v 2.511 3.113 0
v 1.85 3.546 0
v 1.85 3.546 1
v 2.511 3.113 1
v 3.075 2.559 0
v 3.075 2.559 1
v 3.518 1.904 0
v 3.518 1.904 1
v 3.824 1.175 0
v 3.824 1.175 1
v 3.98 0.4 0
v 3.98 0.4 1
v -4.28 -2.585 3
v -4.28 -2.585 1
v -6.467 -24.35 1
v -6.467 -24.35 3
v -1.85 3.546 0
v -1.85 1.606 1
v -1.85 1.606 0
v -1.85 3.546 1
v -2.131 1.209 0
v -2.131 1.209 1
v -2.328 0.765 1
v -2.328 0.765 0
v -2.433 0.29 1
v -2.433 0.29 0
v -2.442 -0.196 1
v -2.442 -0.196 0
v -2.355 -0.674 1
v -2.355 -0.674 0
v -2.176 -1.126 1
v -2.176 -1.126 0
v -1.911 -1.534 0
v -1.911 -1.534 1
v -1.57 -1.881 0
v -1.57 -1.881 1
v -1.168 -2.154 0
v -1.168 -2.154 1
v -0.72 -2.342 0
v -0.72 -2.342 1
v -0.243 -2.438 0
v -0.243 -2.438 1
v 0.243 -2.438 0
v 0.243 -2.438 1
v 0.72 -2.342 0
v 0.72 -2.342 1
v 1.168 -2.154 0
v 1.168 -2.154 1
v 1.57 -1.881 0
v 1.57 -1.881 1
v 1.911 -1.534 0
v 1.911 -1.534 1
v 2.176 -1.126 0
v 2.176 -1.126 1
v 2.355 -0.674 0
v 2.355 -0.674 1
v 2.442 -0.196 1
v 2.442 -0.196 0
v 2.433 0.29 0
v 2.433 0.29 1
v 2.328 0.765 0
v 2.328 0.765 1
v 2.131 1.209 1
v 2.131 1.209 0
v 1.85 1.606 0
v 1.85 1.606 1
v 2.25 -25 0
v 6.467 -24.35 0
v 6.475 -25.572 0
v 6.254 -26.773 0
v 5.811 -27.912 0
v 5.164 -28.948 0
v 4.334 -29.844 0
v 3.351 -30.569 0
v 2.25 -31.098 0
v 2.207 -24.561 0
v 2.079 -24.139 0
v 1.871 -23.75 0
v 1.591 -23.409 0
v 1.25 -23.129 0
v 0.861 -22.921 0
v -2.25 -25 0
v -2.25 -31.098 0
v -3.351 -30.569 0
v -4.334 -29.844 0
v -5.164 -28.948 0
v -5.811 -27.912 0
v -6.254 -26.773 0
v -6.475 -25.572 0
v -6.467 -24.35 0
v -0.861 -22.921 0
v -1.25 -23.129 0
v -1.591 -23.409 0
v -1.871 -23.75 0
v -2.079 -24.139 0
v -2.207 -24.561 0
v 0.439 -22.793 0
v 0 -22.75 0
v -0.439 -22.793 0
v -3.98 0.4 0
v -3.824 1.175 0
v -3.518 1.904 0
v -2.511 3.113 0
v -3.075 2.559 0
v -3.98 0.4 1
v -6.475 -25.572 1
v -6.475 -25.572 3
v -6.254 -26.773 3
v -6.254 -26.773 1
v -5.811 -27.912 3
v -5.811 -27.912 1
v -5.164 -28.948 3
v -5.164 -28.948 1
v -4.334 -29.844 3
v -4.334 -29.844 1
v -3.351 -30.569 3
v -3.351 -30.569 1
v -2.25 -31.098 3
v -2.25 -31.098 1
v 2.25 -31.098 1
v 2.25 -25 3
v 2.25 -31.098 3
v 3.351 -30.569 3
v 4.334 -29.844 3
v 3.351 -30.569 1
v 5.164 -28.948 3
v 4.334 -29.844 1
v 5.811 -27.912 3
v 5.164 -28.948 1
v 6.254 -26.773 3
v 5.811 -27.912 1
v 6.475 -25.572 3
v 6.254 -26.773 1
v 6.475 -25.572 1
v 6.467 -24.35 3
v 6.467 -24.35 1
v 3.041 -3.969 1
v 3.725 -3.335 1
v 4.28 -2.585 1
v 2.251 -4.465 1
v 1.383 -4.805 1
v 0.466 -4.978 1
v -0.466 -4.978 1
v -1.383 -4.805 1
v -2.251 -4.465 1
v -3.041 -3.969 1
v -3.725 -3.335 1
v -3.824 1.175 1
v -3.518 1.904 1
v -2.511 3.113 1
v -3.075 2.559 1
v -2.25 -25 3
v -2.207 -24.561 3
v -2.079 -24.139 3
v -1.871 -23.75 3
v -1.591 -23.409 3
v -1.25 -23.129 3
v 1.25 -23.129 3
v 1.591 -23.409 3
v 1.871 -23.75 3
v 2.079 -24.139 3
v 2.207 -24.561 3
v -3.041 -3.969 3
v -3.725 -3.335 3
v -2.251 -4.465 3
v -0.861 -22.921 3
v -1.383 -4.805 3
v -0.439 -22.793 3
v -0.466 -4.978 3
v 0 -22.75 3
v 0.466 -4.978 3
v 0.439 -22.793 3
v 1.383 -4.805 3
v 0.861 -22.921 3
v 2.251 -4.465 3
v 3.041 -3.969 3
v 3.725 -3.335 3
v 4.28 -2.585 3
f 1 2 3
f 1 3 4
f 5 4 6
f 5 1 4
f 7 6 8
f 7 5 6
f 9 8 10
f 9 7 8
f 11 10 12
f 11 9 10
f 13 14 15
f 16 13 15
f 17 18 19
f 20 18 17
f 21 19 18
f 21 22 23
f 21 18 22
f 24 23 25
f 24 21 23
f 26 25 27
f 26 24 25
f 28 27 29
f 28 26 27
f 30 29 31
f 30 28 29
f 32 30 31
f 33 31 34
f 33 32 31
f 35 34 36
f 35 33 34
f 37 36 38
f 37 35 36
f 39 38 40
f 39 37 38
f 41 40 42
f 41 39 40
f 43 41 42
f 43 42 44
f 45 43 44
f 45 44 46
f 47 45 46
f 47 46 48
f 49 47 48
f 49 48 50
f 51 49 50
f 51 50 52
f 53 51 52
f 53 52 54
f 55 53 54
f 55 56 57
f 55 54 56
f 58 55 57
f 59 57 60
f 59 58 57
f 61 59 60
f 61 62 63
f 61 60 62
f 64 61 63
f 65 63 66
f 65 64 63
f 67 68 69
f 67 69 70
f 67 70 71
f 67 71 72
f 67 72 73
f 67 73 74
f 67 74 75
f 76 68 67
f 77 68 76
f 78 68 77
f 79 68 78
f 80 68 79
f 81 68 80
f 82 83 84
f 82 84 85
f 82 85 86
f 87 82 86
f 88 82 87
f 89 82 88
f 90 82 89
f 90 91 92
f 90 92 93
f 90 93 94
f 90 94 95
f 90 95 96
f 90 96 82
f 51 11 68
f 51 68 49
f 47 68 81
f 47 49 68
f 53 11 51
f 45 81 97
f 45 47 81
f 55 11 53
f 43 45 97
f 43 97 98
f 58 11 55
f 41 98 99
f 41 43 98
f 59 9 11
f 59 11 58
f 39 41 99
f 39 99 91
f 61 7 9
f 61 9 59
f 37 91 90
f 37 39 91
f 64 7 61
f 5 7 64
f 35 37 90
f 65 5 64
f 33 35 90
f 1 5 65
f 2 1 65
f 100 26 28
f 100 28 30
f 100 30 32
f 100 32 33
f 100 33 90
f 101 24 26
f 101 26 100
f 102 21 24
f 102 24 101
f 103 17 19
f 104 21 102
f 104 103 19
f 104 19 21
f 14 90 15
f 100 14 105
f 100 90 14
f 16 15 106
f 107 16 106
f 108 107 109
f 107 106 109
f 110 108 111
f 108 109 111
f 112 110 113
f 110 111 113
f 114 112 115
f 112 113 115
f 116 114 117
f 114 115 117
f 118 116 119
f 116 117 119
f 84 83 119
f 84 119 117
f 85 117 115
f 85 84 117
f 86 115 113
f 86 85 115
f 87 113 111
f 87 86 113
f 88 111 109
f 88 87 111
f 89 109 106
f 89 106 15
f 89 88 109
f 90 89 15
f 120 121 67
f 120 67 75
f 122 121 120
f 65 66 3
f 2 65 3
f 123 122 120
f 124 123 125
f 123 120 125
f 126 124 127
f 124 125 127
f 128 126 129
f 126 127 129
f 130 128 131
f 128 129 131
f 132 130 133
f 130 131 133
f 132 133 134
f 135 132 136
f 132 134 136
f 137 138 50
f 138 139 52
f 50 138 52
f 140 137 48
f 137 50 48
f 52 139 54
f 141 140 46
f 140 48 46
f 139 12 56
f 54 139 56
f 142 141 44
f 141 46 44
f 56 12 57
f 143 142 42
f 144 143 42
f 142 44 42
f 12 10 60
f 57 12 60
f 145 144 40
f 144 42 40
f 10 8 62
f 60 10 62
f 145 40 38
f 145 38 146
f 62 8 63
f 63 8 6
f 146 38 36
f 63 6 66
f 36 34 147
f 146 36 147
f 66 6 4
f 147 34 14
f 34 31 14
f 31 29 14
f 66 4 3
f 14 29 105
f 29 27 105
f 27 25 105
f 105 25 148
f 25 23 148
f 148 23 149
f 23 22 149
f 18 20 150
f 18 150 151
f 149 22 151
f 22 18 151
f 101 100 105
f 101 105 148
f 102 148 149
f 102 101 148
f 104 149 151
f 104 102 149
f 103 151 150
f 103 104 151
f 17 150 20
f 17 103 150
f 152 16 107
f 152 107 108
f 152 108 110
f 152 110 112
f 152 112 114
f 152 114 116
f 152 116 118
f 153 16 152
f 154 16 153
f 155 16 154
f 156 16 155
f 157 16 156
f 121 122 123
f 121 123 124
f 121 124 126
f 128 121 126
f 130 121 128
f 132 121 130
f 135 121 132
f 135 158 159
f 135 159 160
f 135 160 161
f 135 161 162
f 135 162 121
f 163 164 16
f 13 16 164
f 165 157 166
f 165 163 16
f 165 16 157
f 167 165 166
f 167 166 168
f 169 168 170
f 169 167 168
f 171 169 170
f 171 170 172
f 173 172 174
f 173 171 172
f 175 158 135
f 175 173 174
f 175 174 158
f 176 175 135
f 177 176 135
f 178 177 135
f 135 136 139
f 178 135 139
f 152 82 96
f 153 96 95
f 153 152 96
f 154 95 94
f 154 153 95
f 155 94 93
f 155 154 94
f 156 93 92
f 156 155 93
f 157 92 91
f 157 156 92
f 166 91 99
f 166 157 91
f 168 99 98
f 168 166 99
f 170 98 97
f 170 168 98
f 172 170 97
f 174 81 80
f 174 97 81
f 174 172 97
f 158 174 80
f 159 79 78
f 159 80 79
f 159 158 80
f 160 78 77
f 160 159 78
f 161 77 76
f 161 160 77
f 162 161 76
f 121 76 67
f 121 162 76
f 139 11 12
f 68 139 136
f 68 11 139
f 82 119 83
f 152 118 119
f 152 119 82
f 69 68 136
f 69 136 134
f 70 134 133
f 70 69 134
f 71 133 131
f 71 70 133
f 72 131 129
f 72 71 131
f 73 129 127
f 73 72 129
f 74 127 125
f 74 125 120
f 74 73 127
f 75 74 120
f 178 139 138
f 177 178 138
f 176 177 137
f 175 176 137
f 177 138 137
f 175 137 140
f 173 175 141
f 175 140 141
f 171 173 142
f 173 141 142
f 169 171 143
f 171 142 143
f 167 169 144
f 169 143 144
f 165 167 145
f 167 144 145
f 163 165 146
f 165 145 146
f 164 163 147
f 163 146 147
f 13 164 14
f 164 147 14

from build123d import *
from build123d.topology import SkipClean

# Parameters (mm, degrees)
SKETCH3_R           = 2.45
BOSS_EXTRUDE1_DEPTH = 1
SKETCH4_W           = 3.7
SKETCH4_H           = 4
CUT_EXTRUDE1_DEPTH  = 1
BOSS_EXTRUDE2_DEPTH = 2
CUT_EXTRUDE2_DEPTH  = 33.30325061


with BuildPart() as part:
    # Sketch3 → Boss-Extrude1 (new body)
    with BuildSketch(Plane.XY):
        with BuildLine():
            Line((3.979949748, 0.4), (6.467418341, -24.35))
            ThreePointArc((6.467418341, -24.35), (0, -31.5), (-6.467418341, -24.35))
            Line((-6.467418341, -24.35), (-3.979949748, 0.4))
            ThreePointArc((-3.979949748, 0.4), (0, 4), (3.979949748, 0.4))
        make_face()
        Circle(SKETCH3_R, mode=Mode.SUBTRACT)
    extrude(amount=BOSS_EXTRUDE1_DEPTH)

    # Sketch4 → Cut-Extrude1 (cut)
    with BuildSketch(Plane.XY.offset(1)):
        with Locations((0, 2)):
            Rectangle(SKETCH4_W, SKETCH4_H)
    extrude(amount=-CUT_EXTRUDE1_DEPTH, mode=Mode.SUBTRACT)

    # Sketch5 → Boss-Extrude2 (add)
    with SkipClean():  # the faces are left unmerged after this step: merging them gives an invalid solid
        with BuildSketch(Plane.XY.offset(1)):
            with BuildLine():
                Line((-4.279949748, -2.584962311), (-6.467418341, -24.35))
                ThreePointArc((-6.467418341, -24.35), (0, -31.5), (6.467418341, -24.35))
                Line((6.467418341, -24.35), (4.279949748, -2.584962311))
                ThreePointArc((4.279949748, -2.584962311), (0, -5), (-4.279949748, -2.584962311))
            make_face()
        extrude(amount=BOSS_EXTRUDE2_DEPTH)

    # Sketch6 → Cut-Extrude2 (cut, through all)
    with SkipClean():  # the faces are left unmerged after this step: merging them gives an invalid solid
        with BuildSketch(Plane.XY.offset(3)):
            with BuildLine():
                Line((2.25, -25), (2.25, -31.5))
                ThreePointArc((2.25, -31.5), (0, -33.75), (-2.25, -31.5))
                Line((-2.25, -31.5), (-2.25, -25))
                ThreePointArc((-2.25, -25), (0, -22.75), (2.25, -25))
            make_face()
        extrude(amount=-CUT_EXTRUDE2_DEPTH, mode=Mode.SUBTRACT)


solid = part.part
